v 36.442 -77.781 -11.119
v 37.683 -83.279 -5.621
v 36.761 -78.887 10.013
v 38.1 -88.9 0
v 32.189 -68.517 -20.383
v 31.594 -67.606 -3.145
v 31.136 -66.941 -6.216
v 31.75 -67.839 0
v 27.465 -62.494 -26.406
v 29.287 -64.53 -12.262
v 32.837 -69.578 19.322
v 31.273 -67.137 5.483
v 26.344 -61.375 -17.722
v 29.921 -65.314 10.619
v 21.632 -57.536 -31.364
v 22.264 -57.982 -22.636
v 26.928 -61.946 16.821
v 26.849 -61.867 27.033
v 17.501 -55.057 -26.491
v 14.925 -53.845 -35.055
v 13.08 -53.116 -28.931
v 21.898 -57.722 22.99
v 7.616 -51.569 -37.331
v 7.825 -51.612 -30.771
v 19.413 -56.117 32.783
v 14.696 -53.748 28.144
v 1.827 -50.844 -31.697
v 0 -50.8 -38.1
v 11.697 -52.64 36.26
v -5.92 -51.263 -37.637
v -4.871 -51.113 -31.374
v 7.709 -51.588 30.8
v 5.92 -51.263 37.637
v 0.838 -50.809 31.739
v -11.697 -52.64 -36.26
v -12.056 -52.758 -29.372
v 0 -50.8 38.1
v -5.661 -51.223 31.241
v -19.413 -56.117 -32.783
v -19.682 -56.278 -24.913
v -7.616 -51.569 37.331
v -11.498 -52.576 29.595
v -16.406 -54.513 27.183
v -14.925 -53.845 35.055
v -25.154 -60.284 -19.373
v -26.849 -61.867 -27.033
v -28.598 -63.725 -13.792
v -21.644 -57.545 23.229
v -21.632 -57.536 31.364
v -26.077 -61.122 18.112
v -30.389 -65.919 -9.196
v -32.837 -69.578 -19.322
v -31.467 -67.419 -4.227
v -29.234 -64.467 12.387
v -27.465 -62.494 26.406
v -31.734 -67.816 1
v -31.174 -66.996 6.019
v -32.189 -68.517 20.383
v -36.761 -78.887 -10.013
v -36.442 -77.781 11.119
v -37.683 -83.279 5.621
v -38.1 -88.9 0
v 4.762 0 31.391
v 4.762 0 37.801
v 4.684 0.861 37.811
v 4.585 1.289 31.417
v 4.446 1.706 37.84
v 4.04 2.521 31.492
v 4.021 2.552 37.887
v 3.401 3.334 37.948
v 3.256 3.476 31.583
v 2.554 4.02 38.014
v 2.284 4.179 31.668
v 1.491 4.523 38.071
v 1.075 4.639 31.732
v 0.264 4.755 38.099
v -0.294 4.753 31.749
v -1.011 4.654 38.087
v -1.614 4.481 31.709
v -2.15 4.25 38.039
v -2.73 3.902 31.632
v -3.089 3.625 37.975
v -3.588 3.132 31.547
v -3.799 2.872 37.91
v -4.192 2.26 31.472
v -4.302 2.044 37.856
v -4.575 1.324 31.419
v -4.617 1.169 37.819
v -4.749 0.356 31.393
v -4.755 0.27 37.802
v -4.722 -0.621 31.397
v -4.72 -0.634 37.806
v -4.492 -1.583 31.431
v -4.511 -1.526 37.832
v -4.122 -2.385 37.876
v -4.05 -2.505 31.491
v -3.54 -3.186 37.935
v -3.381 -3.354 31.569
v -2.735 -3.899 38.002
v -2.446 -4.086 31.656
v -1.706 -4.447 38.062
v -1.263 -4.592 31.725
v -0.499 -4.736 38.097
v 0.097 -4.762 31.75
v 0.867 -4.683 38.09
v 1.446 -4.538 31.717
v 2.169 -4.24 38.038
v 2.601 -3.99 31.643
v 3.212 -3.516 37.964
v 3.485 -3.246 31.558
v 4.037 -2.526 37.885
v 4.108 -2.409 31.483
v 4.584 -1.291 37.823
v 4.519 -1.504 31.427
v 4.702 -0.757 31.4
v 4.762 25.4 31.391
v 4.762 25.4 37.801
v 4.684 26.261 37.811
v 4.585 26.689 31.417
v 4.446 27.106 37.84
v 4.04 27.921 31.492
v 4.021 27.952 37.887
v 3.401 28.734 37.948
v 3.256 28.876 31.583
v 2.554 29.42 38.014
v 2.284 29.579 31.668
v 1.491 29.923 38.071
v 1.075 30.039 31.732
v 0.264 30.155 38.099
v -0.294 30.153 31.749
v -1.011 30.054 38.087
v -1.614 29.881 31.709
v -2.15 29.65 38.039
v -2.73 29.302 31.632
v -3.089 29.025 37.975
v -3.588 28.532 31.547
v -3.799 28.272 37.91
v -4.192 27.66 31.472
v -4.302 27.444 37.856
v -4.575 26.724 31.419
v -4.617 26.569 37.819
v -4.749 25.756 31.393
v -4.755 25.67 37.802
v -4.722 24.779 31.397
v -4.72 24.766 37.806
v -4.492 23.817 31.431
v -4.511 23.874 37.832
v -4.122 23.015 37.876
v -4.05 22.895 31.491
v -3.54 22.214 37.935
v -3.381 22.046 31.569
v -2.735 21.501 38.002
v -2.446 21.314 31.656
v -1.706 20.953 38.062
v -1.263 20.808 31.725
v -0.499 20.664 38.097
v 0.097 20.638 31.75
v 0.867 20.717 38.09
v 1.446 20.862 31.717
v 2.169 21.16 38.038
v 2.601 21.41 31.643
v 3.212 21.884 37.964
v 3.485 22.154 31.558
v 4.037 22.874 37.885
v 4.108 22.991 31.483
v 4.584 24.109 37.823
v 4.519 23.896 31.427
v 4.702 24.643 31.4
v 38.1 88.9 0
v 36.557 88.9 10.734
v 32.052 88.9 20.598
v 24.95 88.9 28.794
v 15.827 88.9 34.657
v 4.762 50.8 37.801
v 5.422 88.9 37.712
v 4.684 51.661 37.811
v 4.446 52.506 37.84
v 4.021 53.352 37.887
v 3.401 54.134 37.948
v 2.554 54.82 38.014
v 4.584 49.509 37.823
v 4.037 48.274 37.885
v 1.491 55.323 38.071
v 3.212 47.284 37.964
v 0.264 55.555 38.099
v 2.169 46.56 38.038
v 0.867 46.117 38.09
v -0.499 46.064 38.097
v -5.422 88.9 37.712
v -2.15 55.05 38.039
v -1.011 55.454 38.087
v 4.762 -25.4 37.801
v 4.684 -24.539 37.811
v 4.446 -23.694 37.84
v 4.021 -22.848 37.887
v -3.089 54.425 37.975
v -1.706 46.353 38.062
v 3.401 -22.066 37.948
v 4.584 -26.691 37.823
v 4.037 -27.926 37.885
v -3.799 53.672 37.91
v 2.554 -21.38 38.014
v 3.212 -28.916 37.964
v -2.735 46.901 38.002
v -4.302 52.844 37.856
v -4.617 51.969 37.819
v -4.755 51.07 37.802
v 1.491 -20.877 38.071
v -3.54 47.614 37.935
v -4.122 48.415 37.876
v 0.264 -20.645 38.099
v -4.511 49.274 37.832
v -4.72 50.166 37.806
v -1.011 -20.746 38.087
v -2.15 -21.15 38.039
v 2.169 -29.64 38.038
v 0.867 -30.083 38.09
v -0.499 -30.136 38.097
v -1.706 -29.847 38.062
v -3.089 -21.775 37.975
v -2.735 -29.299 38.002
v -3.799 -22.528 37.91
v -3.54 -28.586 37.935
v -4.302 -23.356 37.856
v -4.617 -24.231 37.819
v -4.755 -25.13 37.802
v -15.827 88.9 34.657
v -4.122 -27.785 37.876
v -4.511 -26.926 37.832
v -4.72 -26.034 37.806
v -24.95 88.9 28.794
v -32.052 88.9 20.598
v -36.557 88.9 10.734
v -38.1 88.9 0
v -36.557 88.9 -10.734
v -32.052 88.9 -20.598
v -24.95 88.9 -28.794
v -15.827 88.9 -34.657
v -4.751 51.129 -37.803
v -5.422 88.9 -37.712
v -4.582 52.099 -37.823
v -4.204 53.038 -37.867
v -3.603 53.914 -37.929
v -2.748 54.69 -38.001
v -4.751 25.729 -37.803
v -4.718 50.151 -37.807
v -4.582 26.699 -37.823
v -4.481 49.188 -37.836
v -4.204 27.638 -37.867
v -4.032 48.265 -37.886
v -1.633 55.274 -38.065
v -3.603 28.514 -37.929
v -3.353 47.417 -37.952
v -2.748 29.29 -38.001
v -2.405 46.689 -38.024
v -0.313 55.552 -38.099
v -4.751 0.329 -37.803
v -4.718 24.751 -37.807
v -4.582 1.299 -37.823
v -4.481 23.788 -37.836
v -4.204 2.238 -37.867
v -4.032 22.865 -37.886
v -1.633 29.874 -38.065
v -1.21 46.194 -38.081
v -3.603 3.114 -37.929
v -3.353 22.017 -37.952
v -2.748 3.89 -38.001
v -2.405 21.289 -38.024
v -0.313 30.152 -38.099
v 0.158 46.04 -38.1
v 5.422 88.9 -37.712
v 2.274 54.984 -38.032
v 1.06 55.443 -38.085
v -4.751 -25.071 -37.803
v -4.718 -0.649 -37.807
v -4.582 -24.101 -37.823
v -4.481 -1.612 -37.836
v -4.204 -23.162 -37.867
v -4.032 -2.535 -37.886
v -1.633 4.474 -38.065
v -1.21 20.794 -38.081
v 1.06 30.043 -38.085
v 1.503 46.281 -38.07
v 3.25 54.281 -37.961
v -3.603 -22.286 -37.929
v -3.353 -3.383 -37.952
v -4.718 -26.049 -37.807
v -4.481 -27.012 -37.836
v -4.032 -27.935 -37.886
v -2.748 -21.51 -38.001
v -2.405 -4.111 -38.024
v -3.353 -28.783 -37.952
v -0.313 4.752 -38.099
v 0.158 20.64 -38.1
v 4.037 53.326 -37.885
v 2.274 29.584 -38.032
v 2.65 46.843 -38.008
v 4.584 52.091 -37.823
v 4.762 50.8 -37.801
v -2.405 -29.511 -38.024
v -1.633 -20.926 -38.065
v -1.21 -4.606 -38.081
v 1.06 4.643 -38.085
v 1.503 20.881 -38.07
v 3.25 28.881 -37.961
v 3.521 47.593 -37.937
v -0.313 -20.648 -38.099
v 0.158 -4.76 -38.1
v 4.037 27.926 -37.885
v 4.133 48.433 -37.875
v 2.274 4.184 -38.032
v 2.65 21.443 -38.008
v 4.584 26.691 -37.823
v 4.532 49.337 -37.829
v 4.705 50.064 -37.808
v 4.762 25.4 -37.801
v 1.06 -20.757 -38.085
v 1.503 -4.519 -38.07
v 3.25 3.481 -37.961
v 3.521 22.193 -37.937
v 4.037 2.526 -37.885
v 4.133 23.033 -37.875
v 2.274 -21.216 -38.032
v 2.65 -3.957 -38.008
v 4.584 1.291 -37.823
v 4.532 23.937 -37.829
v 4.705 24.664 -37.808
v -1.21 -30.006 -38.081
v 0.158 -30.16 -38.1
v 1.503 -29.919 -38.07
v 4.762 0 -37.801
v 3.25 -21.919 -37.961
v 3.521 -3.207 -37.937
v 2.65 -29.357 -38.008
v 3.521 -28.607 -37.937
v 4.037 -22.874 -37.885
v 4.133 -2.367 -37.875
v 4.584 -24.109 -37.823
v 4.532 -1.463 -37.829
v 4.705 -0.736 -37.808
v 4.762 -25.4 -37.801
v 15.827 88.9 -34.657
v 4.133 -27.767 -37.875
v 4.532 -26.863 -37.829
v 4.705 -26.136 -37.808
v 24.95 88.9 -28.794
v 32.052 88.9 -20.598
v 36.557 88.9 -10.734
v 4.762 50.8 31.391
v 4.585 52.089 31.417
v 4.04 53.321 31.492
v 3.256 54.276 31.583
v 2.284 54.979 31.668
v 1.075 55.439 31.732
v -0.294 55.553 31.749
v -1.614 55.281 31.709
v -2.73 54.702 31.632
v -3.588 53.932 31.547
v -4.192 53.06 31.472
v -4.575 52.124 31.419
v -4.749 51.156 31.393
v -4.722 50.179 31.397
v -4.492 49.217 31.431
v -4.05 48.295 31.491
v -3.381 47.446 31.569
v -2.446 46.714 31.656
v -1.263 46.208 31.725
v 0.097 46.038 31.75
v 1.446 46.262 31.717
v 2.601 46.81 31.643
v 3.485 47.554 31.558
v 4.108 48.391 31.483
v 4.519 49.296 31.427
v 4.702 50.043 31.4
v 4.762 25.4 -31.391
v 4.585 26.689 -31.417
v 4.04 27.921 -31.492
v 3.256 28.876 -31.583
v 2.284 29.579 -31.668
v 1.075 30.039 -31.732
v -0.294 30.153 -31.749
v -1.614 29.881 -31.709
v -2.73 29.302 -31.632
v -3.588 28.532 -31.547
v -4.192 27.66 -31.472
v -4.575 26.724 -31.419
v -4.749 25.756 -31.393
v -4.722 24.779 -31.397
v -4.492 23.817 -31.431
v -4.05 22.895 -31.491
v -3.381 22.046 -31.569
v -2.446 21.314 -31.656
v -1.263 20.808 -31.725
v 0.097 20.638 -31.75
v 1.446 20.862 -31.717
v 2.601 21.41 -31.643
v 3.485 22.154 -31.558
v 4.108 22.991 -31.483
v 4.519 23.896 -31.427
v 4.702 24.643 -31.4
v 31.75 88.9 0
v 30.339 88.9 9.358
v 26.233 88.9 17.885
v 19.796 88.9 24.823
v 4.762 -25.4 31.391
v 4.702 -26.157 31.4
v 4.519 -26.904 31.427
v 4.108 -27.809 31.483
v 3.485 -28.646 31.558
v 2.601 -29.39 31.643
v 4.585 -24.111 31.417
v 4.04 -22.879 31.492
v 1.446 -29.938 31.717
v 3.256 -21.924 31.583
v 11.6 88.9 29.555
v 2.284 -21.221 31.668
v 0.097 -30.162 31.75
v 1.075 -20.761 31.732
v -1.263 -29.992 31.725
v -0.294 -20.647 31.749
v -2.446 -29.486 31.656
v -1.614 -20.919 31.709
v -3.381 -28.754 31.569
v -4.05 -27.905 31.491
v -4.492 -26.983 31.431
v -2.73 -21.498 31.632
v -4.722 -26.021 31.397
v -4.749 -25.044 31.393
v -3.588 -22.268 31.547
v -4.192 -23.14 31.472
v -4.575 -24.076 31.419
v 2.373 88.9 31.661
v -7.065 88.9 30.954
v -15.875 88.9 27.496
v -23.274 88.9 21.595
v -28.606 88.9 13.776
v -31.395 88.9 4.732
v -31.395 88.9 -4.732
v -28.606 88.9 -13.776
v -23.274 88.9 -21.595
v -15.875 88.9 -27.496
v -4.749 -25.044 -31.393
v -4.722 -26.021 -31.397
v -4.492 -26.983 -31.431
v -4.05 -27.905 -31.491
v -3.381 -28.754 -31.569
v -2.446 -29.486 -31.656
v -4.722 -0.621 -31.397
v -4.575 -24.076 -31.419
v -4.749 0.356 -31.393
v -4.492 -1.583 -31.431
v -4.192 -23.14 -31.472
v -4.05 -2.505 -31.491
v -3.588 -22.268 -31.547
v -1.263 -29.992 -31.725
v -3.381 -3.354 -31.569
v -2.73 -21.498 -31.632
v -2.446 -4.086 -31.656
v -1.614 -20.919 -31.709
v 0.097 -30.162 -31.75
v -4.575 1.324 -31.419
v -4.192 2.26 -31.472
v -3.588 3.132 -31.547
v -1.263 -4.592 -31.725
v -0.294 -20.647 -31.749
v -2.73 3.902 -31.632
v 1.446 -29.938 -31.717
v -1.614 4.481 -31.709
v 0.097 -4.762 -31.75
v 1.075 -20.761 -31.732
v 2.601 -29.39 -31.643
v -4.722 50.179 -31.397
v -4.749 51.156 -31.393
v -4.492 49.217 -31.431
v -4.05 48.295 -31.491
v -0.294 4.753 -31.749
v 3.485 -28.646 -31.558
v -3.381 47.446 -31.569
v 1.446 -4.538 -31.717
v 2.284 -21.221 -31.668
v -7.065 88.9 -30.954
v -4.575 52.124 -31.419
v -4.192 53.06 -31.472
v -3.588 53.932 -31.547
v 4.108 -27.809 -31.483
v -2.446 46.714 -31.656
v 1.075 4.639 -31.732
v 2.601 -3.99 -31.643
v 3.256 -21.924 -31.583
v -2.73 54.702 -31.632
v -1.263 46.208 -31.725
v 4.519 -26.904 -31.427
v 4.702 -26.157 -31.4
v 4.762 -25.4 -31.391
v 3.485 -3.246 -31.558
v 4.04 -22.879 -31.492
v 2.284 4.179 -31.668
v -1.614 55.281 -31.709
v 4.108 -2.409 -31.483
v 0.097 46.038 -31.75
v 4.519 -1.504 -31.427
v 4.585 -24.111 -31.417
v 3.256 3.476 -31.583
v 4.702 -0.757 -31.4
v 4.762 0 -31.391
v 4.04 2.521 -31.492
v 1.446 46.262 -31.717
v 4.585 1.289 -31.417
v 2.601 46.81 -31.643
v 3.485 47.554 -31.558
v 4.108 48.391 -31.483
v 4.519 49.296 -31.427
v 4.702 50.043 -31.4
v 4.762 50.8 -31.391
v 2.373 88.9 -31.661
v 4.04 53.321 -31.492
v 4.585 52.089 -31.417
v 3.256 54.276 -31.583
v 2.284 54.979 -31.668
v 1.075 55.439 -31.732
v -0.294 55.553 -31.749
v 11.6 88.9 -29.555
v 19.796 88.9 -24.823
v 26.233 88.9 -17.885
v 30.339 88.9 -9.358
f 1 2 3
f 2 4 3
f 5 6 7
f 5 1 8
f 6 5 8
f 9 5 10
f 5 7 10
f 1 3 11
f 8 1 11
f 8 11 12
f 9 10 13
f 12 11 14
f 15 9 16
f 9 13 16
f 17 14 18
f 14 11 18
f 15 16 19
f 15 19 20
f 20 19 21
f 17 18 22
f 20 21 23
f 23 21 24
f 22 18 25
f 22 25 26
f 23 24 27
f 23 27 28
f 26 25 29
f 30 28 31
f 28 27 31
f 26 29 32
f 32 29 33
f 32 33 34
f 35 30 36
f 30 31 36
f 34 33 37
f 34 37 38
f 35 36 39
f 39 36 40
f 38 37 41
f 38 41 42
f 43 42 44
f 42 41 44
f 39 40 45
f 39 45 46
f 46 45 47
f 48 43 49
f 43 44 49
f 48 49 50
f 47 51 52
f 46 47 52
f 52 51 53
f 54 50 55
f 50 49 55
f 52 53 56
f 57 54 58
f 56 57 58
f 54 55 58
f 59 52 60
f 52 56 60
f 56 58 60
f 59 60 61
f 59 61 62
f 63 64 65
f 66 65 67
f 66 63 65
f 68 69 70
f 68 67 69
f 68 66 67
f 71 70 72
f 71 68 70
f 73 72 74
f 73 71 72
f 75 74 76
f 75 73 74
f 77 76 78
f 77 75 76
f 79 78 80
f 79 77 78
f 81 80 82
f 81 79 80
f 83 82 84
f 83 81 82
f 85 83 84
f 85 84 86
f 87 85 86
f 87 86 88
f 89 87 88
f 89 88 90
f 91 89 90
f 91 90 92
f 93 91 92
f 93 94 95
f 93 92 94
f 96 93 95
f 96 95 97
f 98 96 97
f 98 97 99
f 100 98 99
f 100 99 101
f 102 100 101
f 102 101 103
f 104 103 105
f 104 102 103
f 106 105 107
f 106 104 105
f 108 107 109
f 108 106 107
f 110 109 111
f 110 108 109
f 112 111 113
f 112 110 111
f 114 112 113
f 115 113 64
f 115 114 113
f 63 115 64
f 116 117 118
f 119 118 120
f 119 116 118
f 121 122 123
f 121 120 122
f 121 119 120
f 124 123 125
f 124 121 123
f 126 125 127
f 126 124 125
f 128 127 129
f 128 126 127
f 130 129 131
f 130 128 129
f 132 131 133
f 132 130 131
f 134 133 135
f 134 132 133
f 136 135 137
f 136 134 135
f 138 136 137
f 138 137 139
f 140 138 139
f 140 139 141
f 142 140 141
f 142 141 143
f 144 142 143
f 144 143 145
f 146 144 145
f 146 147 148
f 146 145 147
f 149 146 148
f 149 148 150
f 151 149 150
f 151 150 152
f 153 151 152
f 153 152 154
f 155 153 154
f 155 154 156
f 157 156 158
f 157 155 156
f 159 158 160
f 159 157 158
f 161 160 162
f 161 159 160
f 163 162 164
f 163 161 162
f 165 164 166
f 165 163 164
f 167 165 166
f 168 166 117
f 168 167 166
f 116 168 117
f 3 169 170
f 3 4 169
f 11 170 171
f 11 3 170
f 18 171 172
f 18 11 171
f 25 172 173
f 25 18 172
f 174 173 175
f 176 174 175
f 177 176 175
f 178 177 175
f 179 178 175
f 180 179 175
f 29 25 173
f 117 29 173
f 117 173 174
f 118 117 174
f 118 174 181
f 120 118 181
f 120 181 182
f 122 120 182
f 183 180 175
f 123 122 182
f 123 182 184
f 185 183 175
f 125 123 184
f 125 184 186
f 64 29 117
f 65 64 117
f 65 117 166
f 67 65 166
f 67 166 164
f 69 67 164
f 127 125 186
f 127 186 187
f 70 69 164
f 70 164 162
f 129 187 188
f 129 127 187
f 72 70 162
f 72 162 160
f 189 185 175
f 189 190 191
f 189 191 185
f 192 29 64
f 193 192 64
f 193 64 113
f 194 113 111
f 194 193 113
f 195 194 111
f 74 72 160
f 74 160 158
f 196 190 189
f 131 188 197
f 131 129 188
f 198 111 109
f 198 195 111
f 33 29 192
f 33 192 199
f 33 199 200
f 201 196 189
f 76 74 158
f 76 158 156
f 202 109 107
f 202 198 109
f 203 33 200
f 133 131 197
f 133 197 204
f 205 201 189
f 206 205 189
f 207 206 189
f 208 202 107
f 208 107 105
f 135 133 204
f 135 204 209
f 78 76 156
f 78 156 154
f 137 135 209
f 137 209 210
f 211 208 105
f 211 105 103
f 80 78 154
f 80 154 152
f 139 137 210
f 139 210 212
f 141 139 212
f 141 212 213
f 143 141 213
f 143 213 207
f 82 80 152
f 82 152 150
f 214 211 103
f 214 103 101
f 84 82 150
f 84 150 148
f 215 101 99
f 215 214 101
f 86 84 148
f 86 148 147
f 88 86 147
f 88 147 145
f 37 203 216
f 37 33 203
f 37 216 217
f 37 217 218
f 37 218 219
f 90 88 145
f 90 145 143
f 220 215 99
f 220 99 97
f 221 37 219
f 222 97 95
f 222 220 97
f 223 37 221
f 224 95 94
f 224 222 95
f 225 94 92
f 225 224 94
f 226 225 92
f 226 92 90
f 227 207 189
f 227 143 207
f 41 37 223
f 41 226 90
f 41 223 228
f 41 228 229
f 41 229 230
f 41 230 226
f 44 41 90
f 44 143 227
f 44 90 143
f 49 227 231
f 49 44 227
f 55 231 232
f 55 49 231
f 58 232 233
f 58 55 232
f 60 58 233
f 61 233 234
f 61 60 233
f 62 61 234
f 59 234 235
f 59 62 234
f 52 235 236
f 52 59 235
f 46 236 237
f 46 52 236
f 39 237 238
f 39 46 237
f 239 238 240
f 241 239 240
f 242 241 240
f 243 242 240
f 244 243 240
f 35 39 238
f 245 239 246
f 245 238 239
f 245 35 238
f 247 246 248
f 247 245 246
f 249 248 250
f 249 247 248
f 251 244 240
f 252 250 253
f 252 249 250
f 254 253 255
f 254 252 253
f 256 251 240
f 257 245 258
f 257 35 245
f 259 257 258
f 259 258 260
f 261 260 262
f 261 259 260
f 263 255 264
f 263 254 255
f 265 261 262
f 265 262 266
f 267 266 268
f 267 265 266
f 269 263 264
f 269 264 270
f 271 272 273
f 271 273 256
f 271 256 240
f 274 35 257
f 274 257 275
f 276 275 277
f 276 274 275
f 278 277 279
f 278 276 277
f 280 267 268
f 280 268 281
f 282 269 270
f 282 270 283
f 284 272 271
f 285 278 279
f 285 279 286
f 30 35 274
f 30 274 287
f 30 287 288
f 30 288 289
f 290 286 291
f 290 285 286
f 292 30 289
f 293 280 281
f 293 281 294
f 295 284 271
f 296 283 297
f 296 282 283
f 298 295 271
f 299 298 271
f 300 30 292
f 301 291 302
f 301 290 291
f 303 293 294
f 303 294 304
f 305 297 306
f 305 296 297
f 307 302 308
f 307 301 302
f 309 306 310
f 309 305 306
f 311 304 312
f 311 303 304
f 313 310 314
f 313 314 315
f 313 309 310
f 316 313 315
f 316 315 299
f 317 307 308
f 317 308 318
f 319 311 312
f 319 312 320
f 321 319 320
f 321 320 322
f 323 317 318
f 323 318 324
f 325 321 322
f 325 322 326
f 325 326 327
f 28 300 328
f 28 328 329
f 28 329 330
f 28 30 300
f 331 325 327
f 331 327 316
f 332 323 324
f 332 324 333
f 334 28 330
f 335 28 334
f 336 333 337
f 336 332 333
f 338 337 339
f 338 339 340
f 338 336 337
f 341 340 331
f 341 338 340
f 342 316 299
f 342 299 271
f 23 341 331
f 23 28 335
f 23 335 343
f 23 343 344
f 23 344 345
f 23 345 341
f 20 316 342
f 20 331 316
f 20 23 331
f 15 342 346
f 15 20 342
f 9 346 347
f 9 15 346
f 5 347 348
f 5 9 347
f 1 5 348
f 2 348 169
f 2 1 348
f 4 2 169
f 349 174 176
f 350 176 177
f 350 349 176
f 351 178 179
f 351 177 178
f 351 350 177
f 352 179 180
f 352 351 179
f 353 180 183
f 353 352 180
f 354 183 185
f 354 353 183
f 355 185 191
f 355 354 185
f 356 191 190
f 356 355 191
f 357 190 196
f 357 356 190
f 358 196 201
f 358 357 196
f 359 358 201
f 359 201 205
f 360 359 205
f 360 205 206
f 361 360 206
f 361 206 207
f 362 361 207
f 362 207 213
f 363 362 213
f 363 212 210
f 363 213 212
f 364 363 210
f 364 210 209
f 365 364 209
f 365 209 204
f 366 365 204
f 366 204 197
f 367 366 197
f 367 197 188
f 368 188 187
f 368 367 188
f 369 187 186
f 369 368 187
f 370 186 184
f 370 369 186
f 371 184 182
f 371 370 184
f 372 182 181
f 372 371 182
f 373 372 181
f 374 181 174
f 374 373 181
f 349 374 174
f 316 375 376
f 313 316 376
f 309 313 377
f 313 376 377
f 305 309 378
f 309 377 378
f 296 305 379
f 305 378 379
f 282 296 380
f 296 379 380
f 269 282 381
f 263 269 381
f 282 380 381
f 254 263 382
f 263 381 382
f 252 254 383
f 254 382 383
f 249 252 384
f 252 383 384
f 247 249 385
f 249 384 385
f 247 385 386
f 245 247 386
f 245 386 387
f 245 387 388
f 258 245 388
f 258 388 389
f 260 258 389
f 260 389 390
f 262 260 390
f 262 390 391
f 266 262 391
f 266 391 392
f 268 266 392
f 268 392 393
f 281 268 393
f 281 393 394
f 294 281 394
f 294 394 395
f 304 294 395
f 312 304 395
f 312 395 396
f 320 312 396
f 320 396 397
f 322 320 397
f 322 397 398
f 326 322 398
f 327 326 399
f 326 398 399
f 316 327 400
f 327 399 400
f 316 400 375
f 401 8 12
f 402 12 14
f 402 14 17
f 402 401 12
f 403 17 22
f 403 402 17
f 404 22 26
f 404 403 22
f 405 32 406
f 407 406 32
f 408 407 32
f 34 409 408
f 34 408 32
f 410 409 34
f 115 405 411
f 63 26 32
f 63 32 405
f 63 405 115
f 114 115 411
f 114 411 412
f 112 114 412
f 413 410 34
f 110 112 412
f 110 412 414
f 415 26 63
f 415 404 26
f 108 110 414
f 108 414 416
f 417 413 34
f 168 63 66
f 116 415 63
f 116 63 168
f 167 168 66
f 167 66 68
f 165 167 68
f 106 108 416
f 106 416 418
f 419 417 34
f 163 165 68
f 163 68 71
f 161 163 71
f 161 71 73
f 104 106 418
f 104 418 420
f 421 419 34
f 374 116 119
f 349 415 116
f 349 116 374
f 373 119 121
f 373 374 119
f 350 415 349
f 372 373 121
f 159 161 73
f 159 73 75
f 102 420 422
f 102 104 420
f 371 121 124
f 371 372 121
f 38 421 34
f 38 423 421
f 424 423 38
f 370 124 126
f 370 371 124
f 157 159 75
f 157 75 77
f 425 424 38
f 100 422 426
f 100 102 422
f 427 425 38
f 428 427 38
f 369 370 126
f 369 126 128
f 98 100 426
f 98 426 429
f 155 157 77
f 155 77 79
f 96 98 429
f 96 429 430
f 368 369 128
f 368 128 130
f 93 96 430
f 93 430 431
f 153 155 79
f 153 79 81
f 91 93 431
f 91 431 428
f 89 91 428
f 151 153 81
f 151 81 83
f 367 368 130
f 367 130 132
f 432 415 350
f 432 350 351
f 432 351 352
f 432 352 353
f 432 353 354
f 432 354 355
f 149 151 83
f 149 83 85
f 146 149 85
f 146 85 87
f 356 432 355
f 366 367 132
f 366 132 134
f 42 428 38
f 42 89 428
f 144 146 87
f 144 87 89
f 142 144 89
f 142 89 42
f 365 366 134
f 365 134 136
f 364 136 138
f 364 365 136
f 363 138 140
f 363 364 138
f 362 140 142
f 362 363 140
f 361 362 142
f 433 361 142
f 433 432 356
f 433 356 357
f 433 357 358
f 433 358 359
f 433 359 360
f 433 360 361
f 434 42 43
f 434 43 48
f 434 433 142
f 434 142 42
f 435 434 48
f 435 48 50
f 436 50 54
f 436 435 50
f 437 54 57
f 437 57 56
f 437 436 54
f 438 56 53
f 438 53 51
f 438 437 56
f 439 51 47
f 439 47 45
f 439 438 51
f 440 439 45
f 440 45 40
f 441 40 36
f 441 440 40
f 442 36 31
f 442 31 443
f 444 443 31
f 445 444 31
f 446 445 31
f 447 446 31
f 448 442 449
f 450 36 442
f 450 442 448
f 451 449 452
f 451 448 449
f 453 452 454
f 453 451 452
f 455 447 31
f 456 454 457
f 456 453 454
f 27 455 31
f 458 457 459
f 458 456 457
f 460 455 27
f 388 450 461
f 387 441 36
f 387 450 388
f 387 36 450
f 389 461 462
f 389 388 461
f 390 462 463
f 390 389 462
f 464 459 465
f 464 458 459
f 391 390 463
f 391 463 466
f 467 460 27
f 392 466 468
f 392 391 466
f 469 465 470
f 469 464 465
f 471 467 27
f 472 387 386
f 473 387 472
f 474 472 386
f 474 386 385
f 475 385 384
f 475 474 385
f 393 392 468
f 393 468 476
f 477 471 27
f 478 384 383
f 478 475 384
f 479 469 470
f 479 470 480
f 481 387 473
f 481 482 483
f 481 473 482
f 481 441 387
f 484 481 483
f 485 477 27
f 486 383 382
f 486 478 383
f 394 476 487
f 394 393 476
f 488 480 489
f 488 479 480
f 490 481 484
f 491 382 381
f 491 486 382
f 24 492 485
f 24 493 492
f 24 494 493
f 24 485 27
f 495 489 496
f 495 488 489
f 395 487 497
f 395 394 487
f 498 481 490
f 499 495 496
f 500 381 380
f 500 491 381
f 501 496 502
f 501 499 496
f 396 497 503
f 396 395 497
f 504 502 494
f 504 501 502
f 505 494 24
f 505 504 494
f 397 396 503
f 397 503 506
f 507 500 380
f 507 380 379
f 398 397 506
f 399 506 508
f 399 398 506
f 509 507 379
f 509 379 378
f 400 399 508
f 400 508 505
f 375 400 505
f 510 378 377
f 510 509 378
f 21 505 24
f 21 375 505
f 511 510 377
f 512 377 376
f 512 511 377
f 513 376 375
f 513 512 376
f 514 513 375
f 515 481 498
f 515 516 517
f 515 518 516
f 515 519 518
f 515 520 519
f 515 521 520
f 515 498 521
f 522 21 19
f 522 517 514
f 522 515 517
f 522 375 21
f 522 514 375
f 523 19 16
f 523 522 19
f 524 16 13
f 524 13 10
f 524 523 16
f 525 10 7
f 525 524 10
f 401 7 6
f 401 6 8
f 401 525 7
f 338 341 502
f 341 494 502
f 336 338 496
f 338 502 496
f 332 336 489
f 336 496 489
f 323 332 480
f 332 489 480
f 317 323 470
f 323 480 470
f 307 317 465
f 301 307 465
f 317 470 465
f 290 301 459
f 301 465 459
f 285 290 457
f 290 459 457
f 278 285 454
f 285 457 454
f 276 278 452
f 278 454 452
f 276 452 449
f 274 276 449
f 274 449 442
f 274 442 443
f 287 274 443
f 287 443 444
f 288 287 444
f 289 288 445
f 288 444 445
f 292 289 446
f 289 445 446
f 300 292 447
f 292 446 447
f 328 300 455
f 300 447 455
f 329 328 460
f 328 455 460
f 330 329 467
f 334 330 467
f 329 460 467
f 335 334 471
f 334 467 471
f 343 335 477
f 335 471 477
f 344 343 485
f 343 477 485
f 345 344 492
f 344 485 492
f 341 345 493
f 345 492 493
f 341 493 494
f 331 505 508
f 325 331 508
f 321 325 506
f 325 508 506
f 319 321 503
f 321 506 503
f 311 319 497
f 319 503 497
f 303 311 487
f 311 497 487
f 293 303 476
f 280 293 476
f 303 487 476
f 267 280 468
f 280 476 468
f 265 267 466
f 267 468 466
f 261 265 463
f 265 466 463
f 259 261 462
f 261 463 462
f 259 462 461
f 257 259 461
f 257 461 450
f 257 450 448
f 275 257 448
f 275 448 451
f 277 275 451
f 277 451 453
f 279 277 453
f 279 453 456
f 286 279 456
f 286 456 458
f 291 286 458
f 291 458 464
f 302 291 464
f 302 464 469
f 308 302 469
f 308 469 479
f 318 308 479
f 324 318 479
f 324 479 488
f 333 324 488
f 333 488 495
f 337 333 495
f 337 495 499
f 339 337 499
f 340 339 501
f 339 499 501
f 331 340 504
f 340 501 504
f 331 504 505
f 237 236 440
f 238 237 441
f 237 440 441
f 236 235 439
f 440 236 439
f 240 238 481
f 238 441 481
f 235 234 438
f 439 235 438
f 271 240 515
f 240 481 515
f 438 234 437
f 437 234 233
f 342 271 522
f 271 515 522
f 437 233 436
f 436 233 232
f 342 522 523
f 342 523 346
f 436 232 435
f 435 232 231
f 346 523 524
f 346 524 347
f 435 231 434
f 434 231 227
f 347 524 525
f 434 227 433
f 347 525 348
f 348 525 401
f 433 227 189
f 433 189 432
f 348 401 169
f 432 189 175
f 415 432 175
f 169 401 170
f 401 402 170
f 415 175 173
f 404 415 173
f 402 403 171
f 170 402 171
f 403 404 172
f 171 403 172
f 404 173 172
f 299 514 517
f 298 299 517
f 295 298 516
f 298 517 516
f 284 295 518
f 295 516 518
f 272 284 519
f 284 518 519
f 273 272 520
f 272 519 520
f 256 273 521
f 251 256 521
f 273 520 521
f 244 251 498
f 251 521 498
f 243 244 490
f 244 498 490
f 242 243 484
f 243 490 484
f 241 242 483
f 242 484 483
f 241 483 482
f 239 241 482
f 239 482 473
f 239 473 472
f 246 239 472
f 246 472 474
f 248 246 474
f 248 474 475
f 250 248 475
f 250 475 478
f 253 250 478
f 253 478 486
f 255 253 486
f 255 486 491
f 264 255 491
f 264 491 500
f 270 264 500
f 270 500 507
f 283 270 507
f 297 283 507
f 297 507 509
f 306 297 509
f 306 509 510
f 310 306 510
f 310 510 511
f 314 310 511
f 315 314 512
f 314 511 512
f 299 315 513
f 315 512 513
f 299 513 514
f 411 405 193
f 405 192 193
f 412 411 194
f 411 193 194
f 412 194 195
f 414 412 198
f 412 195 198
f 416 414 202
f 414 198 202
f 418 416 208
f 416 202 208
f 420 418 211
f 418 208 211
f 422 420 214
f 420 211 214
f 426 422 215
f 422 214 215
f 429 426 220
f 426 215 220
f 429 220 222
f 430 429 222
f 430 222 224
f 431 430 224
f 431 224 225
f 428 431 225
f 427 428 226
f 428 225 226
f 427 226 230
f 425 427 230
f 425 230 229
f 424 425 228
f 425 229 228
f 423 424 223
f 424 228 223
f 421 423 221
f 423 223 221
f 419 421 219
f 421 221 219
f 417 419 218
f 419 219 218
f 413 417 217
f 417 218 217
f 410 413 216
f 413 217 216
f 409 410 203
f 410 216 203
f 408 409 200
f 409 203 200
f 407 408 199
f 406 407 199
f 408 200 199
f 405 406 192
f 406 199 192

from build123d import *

# Parameters (mm, degrees)
F0_R     = 38.1
F0_R_2   = 31.75
F1_DEPTH = 88.9
F2_R     = 38.1
F3_DEPTH = 38.1
F4_R     = 4.7625
F5_DEPTH = 38.1


with BuildPart() as f1:
    # F0 (on Front) → F1 (new body, symmetric)
    with BuildSketch(Plane.XZ):
        Circle(F0_R)
        Circle(F0_R_2, mode=Mode.SUBTRACT)
    extrude(amount=F1_DEPTH, both=True)

    # F2 (on Top) → F3 (cut, symmetric)
    with BuildSketch(Plane.XY):
        with Locations((0, -88.9)):
            Circle(F2_R)
    extrude(amount=F3_DEPTH, both=True, mode=Mode.SUBTRACT)

    # F4 (on Top) → F5 (cut, symmetric)
    with BuildSketch(Plane.XY):
        with Locations((0, 50.8)):
            Circle(F4_R)
        with Locations((0, 25.4)):
            Circle(F4_R)
        Circle(F4_R)
        with Locations((0, -25.4)):
            Circle(F4_R)
    extrude(amount=F5_DEPTH, both=True, mode=Mode.SUBTRACT)


solid = f1.part
